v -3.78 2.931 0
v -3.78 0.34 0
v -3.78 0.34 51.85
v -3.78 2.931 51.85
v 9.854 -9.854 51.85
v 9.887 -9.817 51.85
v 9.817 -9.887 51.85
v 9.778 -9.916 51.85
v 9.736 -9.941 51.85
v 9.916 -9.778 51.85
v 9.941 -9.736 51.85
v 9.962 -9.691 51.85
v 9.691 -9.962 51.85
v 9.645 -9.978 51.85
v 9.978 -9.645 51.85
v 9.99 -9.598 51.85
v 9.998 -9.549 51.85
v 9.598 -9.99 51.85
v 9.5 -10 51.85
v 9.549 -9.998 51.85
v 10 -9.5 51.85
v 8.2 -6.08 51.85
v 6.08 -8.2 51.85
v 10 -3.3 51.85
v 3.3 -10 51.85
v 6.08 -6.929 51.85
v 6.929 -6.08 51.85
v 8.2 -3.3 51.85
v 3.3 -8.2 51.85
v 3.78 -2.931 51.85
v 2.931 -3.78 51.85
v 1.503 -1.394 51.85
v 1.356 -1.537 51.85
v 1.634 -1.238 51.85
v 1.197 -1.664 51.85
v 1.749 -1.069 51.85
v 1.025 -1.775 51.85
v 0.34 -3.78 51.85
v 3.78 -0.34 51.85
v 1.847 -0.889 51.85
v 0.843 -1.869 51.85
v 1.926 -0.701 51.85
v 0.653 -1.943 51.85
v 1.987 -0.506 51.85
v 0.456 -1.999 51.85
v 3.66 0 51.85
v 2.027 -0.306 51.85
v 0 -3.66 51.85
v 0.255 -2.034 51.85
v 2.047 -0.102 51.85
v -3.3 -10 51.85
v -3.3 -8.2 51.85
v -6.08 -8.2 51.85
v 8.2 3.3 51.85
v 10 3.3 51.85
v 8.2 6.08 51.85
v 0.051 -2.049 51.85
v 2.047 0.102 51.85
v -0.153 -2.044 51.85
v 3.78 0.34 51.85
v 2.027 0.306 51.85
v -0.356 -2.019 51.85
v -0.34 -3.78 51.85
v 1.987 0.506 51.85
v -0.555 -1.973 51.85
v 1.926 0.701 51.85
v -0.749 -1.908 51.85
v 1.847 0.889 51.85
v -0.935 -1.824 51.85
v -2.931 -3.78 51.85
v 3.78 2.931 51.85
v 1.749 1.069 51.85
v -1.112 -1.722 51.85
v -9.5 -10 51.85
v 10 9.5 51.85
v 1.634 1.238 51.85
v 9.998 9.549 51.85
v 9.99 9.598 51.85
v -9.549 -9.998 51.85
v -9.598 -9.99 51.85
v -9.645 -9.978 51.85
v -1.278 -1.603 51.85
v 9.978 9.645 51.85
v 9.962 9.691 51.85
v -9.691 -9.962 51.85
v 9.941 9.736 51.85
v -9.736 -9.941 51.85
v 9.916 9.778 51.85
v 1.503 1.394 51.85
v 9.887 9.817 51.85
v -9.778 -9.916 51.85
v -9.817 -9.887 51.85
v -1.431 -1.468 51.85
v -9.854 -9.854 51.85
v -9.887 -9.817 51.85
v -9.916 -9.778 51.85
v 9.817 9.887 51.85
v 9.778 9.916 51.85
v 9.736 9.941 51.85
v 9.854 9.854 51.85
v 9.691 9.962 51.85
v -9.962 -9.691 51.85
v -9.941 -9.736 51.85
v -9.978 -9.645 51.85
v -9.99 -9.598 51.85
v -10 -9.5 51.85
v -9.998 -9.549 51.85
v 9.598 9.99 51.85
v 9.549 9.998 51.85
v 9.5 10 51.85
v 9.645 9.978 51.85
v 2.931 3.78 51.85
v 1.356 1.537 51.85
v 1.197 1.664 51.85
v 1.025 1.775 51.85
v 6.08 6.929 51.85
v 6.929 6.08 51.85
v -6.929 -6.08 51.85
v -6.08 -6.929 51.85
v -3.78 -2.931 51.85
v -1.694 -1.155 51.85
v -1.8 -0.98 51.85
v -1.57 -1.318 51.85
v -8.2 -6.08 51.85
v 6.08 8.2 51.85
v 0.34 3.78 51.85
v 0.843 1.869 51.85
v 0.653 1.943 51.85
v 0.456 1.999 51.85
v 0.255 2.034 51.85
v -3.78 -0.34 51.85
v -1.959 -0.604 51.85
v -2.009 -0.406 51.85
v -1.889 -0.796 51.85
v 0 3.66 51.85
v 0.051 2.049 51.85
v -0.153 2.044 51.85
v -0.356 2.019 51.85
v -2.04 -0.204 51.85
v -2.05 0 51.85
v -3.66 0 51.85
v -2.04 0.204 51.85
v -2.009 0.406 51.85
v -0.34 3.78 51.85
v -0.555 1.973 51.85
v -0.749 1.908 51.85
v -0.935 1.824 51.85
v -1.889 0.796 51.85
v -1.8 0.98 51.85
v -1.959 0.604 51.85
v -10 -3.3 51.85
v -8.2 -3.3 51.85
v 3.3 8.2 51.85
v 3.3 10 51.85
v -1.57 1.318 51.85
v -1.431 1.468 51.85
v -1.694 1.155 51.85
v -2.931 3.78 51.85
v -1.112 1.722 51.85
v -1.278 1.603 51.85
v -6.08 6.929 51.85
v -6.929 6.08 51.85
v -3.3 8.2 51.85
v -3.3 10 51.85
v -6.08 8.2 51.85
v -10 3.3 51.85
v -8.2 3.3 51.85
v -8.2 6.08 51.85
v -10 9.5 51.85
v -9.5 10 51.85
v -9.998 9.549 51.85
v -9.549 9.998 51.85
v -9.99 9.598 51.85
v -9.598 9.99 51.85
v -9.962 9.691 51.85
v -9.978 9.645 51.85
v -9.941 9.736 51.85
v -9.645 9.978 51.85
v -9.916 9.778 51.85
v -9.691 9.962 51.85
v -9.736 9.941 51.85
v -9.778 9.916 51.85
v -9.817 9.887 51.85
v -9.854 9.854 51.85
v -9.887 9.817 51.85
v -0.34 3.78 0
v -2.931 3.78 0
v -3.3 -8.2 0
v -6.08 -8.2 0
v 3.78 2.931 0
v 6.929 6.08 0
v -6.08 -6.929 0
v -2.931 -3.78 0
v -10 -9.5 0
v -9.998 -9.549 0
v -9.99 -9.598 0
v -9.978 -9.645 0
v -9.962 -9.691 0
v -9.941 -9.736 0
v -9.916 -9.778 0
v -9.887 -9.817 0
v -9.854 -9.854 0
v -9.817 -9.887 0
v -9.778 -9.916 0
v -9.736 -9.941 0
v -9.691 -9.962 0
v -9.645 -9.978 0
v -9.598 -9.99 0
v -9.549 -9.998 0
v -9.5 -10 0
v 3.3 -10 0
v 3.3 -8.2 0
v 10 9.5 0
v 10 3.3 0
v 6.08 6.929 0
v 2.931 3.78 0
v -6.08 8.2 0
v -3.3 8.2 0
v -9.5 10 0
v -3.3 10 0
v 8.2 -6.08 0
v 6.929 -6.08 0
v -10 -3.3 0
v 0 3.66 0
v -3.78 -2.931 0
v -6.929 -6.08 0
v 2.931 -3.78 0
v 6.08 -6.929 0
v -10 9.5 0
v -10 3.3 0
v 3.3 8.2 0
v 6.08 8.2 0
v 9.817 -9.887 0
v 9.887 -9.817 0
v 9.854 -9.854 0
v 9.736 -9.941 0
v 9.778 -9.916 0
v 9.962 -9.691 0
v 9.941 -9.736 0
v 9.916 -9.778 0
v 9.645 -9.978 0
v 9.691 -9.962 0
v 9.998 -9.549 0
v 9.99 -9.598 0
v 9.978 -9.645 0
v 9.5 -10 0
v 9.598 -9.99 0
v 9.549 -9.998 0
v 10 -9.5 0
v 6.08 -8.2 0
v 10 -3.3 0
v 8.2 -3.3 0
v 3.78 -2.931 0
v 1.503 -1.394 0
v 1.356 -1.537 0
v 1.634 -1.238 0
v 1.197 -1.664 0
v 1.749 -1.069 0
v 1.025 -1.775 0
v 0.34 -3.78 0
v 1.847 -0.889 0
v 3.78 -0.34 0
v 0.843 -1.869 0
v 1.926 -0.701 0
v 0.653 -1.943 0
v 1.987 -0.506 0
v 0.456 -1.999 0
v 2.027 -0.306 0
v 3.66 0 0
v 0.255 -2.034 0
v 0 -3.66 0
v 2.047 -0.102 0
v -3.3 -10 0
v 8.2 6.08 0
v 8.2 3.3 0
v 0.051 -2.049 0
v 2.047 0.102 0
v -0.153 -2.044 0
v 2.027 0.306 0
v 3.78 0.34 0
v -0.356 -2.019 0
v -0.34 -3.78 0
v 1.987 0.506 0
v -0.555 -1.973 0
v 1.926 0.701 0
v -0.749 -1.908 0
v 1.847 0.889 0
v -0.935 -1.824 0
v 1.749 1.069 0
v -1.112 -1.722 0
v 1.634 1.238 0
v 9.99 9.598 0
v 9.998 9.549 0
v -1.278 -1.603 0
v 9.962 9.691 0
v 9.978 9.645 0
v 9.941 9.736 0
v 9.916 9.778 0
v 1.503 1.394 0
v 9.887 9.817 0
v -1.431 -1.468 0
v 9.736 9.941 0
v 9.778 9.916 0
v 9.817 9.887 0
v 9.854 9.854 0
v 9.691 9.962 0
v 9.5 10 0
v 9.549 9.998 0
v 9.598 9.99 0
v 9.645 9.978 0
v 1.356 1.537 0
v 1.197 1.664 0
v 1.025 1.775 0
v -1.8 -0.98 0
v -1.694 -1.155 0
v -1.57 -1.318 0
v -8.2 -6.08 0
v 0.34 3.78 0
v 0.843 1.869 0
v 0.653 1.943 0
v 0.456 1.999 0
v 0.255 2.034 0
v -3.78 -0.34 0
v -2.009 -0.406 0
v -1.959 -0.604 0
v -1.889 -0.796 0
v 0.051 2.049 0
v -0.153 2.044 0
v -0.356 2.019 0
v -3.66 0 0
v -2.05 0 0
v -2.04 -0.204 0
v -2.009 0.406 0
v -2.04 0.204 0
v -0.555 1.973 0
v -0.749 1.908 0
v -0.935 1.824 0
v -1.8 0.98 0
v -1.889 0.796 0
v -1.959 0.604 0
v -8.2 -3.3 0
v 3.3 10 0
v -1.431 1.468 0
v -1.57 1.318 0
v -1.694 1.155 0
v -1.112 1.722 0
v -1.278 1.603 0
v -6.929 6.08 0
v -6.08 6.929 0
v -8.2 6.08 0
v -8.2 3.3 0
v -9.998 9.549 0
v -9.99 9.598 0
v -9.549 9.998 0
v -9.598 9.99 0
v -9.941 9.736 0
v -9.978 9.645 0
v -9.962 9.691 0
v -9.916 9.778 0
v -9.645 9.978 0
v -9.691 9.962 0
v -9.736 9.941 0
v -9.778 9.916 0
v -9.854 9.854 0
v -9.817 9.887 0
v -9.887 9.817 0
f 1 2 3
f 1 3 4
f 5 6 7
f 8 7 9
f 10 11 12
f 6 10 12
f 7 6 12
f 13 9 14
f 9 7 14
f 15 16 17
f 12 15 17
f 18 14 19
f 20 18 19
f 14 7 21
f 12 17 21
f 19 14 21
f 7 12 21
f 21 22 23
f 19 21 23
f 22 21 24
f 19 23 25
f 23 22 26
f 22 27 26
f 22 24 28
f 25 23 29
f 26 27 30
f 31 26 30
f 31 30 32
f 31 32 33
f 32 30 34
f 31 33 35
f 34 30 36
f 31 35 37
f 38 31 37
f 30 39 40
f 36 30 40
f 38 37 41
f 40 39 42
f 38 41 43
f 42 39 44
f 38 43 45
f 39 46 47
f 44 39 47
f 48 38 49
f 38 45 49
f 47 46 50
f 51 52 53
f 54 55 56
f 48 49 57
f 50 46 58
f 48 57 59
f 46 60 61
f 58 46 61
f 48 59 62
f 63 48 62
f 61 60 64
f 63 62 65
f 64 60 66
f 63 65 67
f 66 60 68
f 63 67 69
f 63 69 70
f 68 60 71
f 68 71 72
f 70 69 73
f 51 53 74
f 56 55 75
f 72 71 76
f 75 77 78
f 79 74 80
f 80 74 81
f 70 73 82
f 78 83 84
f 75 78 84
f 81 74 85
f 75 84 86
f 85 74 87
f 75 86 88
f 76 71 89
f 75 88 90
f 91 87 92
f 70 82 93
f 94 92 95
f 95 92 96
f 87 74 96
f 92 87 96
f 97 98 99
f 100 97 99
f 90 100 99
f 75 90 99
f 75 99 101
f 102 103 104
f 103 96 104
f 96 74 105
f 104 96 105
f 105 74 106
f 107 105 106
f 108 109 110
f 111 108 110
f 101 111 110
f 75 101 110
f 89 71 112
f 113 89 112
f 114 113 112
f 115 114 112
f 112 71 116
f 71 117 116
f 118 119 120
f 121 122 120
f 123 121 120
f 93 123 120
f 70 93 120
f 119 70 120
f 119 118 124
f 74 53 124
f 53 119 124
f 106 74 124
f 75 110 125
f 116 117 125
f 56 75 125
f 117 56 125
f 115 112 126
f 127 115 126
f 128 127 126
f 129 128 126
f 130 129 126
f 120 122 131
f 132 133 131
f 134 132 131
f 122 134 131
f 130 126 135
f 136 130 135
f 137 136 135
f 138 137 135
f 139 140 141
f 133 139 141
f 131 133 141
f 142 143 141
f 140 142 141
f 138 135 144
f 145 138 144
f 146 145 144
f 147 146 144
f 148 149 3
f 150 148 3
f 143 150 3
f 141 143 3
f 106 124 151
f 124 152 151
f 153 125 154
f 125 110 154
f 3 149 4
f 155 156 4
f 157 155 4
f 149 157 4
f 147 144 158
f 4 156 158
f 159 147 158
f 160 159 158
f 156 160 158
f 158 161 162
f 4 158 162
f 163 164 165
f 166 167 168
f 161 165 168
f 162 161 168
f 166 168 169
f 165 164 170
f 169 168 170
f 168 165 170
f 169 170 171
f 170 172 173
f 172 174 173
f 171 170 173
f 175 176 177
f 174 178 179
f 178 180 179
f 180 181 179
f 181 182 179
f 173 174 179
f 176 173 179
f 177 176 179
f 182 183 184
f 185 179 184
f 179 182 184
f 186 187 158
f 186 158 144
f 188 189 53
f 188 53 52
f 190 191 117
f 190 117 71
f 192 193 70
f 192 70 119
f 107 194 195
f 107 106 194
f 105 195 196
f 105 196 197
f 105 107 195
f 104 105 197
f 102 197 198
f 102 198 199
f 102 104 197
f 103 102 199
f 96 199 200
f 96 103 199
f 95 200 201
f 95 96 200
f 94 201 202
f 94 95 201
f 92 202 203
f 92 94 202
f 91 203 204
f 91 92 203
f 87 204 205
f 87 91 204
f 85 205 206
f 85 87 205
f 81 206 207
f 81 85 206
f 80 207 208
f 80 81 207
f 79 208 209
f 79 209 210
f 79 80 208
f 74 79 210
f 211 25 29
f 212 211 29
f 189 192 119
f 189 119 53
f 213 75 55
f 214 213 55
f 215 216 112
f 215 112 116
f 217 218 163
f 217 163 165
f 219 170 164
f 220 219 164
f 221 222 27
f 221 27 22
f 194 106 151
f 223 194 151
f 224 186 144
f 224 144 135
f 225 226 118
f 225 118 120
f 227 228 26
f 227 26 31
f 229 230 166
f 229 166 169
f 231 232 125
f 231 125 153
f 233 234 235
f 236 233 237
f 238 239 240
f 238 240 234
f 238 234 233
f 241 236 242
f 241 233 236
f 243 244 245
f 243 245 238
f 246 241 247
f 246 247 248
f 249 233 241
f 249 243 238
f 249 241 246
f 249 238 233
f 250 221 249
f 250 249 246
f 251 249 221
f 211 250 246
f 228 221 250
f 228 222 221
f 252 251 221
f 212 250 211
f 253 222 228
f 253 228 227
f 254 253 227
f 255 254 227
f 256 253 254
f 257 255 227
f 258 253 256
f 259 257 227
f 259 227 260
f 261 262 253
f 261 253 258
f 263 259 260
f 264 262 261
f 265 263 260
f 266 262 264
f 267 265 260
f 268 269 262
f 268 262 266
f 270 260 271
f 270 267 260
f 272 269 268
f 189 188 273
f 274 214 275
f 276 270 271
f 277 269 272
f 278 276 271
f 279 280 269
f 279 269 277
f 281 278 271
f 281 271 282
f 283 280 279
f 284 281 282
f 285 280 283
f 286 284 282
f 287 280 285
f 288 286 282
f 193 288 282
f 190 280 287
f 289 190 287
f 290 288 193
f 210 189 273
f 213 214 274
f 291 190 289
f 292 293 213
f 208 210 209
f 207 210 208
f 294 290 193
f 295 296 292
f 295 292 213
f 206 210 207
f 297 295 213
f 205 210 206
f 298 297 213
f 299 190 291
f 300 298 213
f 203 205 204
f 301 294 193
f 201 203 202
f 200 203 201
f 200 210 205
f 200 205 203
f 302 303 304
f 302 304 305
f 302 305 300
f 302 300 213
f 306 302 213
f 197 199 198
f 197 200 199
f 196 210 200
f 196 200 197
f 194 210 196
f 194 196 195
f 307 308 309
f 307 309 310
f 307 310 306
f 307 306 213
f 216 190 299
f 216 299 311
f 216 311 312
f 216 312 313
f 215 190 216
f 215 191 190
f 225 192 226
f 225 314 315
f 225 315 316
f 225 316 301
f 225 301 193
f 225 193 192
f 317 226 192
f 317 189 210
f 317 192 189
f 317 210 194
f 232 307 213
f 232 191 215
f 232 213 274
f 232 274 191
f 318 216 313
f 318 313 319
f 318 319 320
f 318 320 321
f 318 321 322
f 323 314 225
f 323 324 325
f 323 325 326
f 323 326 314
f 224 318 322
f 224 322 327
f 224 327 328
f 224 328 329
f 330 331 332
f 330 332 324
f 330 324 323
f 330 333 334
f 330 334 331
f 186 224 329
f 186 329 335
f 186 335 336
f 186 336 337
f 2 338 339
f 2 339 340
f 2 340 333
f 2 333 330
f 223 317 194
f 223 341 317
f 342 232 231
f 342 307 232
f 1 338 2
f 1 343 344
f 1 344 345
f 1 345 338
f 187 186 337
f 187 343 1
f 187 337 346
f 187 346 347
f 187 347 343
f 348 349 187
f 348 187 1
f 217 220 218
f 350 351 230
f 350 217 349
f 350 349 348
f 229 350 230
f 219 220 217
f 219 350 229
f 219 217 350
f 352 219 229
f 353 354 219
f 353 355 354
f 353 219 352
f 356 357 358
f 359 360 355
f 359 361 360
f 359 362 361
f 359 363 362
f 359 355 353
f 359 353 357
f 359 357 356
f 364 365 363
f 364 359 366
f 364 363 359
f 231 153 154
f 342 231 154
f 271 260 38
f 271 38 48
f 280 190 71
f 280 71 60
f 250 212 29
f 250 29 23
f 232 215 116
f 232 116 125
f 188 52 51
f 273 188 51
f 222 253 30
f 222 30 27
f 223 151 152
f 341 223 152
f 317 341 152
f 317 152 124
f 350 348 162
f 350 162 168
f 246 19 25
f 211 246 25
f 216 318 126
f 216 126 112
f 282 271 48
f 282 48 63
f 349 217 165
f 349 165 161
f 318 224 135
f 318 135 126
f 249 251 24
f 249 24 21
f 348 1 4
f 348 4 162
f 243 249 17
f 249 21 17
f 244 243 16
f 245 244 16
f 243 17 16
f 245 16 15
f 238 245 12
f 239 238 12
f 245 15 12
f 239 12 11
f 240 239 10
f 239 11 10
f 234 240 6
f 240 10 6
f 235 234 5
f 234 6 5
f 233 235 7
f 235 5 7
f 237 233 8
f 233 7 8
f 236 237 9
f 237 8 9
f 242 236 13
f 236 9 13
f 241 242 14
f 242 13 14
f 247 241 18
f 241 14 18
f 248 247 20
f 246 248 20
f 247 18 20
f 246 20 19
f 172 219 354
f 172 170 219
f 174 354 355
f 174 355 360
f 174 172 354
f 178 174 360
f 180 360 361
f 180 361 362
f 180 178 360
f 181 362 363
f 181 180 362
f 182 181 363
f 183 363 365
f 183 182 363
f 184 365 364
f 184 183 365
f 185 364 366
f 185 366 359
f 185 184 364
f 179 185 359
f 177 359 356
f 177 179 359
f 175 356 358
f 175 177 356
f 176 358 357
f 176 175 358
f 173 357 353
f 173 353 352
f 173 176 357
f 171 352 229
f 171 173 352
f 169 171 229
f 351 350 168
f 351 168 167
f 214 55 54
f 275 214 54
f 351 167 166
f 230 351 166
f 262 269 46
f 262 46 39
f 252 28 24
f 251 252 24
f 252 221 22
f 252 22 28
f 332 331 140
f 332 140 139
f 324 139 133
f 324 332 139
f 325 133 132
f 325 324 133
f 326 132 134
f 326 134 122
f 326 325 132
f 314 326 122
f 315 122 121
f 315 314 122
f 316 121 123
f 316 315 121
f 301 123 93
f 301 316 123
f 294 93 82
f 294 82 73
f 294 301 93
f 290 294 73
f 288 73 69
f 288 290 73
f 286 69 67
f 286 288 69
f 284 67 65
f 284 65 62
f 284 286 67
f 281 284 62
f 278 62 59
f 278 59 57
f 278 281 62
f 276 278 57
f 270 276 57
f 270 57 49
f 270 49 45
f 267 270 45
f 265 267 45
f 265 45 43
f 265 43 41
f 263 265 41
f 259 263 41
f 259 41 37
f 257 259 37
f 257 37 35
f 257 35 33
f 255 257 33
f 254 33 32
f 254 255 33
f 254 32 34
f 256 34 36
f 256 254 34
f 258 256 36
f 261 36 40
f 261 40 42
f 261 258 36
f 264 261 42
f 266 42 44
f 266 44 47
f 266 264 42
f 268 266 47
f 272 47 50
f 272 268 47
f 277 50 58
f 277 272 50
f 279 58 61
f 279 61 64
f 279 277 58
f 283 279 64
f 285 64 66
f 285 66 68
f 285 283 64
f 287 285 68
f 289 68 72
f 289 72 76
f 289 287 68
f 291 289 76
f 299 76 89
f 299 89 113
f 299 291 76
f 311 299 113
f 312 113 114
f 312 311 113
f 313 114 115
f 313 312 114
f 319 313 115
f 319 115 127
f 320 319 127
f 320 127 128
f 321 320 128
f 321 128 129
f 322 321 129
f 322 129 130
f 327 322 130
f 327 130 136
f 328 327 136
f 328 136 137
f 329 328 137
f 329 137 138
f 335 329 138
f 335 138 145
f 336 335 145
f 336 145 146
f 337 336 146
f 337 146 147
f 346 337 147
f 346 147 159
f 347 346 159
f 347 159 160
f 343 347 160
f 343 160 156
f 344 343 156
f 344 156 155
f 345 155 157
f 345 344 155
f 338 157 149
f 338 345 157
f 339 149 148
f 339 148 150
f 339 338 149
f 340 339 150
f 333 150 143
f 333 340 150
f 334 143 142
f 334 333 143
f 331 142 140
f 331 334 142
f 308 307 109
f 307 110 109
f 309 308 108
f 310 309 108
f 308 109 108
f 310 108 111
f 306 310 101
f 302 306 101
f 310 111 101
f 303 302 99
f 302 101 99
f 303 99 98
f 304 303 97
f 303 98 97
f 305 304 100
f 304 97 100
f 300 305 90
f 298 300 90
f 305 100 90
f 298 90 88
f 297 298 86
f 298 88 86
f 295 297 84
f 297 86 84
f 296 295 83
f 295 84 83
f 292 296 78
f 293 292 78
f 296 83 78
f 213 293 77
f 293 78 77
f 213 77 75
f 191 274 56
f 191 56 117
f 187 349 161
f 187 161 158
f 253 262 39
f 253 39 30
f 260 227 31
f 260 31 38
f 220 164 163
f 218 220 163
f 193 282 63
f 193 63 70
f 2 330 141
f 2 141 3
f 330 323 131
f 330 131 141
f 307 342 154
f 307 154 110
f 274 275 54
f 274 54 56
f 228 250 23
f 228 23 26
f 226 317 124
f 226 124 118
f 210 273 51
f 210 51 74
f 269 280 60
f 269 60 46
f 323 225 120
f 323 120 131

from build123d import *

# Parameters (mm, degrees)
SKETCH1_R           = 2.05
BOSS_EXTRUDE1_DEPTH = 51.85
FILLET1_R           = 0.5


with BuildPart() as part:
    # Sketch1 → Boss-Extrude1 (new body)
    with BuildSketch(Plane.XY):
        Polygon((-3.3, 10), (-3.3, 8.2), (-6.08, 8.2), (-6.08, 6.928528137), (-2.931471863, 3.78), (-0.34, 3.78), (0, 3.66), (0.34, 3.78), (2.931471863, 3.78), (6.08, 6.928528137), (6.08, 8.2), (3.3, 8.2), (3.3, 10), (10, 10), (10, 3.3), (8.2, 3.3), (8.2, 6.08), (6.928528137, 6.08), (3.78, 2.931471863), (3.78, 0.34), (3.66, 0), (3.78, -0.34), (3.78, -2.931471863), (6.928528137, -6.08), (8.2, -6.08), (8.2, -3.3), (10, -3.3), (10, -10), (3.3, -10), (3.3, -8.2), (6.08, -8.2), (6.08, -6.928528137), (2.931471863, -3.78), (0.34, -3.78), (0, -3.66), (-0.34, -3.78), (-2.931471863, -3.78), (-6.08, -6.928528137), (-6.08, -8.2), (-3.3, -8.2), (-3.3, -10), (-10, -10), (-10, -3.3), (-8.2, -3.3), (-8.2, -6.08), (-6.928528137, -6.08), (-3.78, -2.931471863), (-3.78, -0.34), (-3.66, 0), (-3.78, 0.34), (-3.78, 2.931471863), (-6.928528137, 6.08), (-8.2, 6.08), (-8.2, 3.3), (-10, 3.3), (-10, 10), align=None)
        with Locations(Location((0, 0, 0), (0, 0, 180))):
            Circle(SKETCH1_R, mode=Mode.SUBTRACT)
    extrude(amount=BOSS_EXTRUDE1_DEPTH)

    # Fillet1
    fillet1_edges = [part.edges().sort_by_distance(p)[0] for p in [
        (10, 10, 25.925),
        (10, -10, 25.925),
        (-10, -10, 25.925),
        (-10, 10, 25.925),
    ]]
    fillet(fillet1_edges, radius=FILLET1_R)


solid = part.part
